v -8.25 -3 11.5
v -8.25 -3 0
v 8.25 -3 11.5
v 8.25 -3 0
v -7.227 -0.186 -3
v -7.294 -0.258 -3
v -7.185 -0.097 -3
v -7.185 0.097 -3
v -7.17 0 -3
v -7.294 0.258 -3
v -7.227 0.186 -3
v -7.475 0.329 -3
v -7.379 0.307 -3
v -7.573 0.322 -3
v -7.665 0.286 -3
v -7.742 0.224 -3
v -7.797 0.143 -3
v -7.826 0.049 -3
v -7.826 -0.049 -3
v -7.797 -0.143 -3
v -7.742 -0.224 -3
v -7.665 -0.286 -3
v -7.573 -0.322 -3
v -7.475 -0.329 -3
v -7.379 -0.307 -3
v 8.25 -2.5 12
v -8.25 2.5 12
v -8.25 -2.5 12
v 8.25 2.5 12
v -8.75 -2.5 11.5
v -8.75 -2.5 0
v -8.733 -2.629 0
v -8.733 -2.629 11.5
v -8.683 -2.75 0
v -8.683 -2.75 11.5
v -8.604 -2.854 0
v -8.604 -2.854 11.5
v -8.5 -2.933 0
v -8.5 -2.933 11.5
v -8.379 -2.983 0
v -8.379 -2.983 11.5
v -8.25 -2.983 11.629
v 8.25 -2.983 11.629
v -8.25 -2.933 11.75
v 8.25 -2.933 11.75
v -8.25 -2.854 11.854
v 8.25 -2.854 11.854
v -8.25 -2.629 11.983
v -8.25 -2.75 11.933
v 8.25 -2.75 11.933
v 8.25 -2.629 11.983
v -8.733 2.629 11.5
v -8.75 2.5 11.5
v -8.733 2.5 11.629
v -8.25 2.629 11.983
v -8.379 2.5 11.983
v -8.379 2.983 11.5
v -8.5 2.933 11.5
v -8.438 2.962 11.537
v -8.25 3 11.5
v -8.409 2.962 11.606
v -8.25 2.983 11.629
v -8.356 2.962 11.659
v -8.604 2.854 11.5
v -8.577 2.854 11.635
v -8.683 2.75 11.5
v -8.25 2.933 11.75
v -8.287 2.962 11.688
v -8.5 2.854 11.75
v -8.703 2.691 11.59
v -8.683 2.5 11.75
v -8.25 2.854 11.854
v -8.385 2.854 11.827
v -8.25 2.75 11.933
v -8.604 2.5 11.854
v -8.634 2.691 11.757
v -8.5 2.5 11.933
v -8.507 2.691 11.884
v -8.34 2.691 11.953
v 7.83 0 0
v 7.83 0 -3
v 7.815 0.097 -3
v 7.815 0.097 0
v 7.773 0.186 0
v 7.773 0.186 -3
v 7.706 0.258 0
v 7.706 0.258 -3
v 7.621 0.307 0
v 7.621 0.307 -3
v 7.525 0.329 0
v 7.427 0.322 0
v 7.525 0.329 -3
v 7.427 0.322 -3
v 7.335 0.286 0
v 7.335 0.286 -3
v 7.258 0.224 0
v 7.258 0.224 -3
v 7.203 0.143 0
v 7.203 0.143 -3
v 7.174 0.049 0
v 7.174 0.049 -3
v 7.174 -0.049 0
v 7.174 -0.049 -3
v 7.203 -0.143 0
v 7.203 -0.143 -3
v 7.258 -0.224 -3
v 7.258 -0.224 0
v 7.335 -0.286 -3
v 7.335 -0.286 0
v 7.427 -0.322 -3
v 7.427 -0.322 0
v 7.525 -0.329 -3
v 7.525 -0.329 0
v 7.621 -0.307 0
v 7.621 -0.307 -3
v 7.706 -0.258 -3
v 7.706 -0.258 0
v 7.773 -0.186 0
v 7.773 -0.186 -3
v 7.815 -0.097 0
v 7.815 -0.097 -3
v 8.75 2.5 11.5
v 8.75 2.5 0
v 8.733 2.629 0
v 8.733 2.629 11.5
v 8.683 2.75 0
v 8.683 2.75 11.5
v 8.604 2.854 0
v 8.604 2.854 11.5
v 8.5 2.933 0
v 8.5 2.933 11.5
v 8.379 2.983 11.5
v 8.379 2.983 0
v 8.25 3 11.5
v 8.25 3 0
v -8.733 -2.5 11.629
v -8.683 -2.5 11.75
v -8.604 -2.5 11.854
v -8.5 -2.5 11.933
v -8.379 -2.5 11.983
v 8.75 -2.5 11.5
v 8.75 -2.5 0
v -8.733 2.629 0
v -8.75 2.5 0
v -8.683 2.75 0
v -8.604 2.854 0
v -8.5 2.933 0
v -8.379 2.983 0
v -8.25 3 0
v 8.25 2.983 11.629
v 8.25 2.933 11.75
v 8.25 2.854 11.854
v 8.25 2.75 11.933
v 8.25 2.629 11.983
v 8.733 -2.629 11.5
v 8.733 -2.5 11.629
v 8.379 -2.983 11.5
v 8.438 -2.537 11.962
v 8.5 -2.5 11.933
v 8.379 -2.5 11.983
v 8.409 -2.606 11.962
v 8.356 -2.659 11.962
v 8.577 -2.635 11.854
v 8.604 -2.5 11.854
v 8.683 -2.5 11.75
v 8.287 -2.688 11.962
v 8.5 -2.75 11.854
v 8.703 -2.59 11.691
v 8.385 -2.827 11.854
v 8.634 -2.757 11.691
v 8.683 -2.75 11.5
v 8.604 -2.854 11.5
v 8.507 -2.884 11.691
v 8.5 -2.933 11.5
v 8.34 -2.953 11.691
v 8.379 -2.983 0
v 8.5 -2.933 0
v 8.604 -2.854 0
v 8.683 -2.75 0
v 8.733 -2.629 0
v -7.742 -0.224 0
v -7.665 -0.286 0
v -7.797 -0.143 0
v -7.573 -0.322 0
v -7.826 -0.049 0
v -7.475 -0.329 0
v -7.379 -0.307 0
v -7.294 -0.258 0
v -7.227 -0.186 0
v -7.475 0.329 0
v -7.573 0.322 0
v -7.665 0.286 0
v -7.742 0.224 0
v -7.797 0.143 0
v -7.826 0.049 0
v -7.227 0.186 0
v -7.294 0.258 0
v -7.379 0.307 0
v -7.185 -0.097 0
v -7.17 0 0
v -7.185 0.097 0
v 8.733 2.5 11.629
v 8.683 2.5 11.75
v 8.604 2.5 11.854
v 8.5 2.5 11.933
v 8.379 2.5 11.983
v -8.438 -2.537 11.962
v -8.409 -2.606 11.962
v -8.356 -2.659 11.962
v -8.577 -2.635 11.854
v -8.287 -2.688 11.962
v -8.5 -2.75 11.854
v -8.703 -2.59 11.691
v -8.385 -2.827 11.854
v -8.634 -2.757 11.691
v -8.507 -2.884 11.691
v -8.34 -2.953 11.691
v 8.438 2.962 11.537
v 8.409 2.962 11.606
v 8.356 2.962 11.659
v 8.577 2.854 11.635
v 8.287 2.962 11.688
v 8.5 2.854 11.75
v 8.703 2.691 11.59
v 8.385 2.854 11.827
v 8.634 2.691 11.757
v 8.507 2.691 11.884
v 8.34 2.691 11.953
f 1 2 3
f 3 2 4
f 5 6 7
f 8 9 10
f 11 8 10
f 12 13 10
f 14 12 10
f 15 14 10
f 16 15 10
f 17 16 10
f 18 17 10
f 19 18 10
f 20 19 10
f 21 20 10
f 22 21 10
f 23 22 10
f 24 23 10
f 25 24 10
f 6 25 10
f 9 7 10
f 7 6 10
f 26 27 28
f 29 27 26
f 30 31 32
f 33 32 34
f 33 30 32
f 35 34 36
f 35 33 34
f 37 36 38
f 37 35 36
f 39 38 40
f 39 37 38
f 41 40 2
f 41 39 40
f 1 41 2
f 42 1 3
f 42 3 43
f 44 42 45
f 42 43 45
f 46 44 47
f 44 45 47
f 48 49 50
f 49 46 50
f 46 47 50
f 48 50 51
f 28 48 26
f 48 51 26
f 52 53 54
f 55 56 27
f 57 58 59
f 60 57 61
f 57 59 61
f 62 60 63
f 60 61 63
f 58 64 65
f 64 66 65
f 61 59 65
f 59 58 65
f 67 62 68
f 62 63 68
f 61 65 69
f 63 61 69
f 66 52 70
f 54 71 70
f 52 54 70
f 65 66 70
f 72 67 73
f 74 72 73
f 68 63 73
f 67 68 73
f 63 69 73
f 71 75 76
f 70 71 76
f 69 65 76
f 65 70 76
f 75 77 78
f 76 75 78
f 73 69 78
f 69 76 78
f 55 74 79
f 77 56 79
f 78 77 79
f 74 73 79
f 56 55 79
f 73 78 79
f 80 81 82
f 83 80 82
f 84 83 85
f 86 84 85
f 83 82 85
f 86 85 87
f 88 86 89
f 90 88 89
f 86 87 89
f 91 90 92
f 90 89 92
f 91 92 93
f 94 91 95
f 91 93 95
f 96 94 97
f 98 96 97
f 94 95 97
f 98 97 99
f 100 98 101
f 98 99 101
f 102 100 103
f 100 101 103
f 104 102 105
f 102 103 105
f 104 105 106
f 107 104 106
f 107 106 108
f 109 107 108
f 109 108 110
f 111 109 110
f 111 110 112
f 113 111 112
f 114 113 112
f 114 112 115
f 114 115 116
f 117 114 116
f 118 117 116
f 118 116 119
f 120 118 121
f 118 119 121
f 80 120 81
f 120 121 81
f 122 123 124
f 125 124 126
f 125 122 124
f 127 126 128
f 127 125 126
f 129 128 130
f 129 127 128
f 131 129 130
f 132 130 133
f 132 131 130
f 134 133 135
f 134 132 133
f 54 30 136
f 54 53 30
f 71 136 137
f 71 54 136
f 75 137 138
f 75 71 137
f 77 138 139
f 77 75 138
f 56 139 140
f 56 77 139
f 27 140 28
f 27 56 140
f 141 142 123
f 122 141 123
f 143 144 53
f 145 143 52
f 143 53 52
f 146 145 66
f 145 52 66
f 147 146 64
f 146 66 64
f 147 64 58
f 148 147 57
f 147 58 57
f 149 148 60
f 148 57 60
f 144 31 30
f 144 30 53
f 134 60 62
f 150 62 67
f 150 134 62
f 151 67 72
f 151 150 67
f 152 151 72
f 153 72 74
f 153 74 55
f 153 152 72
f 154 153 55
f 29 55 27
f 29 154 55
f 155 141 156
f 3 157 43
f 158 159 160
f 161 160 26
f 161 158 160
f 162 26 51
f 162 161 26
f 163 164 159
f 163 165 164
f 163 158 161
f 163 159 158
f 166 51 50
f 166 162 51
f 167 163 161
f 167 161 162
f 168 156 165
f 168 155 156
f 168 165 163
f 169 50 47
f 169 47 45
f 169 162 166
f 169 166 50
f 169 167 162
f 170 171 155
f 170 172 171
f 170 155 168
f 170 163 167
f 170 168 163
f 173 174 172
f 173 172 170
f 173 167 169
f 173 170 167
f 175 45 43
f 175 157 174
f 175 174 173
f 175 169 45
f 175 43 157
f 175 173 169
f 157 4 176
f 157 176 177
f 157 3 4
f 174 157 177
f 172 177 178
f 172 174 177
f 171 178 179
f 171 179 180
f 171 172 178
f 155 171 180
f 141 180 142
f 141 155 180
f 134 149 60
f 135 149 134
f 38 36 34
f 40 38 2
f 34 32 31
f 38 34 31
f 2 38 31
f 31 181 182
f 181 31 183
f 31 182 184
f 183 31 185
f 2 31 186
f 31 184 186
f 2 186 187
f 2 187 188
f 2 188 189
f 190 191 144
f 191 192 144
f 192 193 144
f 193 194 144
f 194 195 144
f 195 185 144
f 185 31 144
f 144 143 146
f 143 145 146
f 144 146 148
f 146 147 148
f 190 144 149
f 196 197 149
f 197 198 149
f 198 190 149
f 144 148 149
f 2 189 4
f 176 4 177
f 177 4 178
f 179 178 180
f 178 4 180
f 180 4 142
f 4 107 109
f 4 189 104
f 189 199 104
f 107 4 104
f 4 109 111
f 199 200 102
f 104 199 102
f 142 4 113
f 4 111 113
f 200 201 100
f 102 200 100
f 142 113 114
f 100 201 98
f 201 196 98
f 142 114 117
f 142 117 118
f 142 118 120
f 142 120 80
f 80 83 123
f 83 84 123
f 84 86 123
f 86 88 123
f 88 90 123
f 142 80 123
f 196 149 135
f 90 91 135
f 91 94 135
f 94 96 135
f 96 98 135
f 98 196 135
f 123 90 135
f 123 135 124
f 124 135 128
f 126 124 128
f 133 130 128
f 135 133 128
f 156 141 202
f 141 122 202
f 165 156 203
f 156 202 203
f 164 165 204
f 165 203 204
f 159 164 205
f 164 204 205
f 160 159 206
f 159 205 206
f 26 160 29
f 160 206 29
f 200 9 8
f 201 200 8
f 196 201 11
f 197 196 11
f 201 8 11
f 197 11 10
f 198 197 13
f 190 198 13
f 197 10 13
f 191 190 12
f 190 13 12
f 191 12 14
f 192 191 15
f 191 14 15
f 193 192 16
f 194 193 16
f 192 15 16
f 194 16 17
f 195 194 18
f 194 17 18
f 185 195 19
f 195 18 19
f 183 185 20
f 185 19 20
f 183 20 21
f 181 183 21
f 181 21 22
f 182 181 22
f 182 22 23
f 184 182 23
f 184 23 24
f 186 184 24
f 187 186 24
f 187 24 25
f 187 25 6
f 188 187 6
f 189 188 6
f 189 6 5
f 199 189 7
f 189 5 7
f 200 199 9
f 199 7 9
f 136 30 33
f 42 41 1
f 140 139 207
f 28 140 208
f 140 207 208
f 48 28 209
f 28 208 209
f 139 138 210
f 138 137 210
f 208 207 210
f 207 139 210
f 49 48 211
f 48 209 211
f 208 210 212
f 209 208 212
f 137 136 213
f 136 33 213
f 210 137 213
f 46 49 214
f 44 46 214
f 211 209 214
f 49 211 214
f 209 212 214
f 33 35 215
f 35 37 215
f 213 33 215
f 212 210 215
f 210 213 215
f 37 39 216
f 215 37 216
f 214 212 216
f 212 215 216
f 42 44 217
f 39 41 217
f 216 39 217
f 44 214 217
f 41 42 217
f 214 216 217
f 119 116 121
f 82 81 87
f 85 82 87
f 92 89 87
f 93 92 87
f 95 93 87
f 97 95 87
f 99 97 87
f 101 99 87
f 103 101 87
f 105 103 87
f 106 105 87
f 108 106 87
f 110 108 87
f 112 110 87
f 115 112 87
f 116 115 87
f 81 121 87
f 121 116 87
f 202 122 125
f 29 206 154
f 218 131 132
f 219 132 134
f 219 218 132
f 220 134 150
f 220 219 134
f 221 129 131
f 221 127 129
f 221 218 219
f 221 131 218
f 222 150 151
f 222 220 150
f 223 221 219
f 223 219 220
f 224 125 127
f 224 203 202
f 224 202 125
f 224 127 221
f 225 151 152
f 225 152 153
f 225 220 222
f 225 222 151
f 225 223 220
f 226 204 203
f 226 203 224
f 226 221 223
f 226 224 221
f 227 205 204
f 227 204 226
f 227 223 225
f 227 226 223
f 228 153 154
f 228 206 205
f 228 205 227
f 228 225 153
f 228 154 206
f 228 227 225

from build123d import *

# Parameters (mm, degrees)
CYLINDER001_R     = 0.33
CYLINDER001_DEPTH = 3
CYLINDER_R        = 0.33
CYLINDER_DEPTH    = 3
BOX_W             = 17.5
BOX_H             = 6
BOX_DEPTH         = 12
FILLET_R          = 0.5


with BuildPart() as pin2:
    # Cylinder001 → Cylinder001 (new body)
    with BuildSketch(Plane(origin=(7.5, 0, -3), x_dir=(1, 0, 0), z_dir=(0, 0, 1))):
        Circle(CYLINDER001_R)
    extrude(amount=CYLINDER001_DEPTH)


with BuildPart() as pin1:
    # Cylinder → Cylinder (new body)
    with BuildSketch(Plane(origin=(-7.5, 0, -3), x_dir=(1, 0, 0), z_dir=(0, 0, 1))):
        Circle(CYLINDER_R)
    extrude(amount=CYLINDER_DEPTH)


with BuildPart() as caparv1500w60l1750t600h1200:
    # Box → Box (new body)
    with BuildSketch(Plane(origin=(-8.75, -3, 0), x_dir=(1, 0, 0), z_dir=(0, 0, 1))):
        with Locations((8.75, 3)):
            Rectangle(BOX_W, BOX_H)
    extrude(amount=BOX_DEPTH)

    # Fillet
    fillet_edges = [caparv1500w60l1750t600h1200.edges().sort_by_distance(p)[0] for p in [
        (-8.75, -3, 6),
        (-8.75, 0, 12),
        (-8.75, 3, 6),
        (8.75, -3, 6),
        (8.75, 0, 12),
        (8.75, 3, 6),
        (0, -3, 12),
        (0, 3, 12),
    ]]
    fillet(fillet_edges, radius=FILLET_R)

    # Fusion: union Pin1
    add(pin1.part)

    # Fusion001: union Pin2
    add(pin2.part)


solid = caparv1500w60l1750t600h1200.part
